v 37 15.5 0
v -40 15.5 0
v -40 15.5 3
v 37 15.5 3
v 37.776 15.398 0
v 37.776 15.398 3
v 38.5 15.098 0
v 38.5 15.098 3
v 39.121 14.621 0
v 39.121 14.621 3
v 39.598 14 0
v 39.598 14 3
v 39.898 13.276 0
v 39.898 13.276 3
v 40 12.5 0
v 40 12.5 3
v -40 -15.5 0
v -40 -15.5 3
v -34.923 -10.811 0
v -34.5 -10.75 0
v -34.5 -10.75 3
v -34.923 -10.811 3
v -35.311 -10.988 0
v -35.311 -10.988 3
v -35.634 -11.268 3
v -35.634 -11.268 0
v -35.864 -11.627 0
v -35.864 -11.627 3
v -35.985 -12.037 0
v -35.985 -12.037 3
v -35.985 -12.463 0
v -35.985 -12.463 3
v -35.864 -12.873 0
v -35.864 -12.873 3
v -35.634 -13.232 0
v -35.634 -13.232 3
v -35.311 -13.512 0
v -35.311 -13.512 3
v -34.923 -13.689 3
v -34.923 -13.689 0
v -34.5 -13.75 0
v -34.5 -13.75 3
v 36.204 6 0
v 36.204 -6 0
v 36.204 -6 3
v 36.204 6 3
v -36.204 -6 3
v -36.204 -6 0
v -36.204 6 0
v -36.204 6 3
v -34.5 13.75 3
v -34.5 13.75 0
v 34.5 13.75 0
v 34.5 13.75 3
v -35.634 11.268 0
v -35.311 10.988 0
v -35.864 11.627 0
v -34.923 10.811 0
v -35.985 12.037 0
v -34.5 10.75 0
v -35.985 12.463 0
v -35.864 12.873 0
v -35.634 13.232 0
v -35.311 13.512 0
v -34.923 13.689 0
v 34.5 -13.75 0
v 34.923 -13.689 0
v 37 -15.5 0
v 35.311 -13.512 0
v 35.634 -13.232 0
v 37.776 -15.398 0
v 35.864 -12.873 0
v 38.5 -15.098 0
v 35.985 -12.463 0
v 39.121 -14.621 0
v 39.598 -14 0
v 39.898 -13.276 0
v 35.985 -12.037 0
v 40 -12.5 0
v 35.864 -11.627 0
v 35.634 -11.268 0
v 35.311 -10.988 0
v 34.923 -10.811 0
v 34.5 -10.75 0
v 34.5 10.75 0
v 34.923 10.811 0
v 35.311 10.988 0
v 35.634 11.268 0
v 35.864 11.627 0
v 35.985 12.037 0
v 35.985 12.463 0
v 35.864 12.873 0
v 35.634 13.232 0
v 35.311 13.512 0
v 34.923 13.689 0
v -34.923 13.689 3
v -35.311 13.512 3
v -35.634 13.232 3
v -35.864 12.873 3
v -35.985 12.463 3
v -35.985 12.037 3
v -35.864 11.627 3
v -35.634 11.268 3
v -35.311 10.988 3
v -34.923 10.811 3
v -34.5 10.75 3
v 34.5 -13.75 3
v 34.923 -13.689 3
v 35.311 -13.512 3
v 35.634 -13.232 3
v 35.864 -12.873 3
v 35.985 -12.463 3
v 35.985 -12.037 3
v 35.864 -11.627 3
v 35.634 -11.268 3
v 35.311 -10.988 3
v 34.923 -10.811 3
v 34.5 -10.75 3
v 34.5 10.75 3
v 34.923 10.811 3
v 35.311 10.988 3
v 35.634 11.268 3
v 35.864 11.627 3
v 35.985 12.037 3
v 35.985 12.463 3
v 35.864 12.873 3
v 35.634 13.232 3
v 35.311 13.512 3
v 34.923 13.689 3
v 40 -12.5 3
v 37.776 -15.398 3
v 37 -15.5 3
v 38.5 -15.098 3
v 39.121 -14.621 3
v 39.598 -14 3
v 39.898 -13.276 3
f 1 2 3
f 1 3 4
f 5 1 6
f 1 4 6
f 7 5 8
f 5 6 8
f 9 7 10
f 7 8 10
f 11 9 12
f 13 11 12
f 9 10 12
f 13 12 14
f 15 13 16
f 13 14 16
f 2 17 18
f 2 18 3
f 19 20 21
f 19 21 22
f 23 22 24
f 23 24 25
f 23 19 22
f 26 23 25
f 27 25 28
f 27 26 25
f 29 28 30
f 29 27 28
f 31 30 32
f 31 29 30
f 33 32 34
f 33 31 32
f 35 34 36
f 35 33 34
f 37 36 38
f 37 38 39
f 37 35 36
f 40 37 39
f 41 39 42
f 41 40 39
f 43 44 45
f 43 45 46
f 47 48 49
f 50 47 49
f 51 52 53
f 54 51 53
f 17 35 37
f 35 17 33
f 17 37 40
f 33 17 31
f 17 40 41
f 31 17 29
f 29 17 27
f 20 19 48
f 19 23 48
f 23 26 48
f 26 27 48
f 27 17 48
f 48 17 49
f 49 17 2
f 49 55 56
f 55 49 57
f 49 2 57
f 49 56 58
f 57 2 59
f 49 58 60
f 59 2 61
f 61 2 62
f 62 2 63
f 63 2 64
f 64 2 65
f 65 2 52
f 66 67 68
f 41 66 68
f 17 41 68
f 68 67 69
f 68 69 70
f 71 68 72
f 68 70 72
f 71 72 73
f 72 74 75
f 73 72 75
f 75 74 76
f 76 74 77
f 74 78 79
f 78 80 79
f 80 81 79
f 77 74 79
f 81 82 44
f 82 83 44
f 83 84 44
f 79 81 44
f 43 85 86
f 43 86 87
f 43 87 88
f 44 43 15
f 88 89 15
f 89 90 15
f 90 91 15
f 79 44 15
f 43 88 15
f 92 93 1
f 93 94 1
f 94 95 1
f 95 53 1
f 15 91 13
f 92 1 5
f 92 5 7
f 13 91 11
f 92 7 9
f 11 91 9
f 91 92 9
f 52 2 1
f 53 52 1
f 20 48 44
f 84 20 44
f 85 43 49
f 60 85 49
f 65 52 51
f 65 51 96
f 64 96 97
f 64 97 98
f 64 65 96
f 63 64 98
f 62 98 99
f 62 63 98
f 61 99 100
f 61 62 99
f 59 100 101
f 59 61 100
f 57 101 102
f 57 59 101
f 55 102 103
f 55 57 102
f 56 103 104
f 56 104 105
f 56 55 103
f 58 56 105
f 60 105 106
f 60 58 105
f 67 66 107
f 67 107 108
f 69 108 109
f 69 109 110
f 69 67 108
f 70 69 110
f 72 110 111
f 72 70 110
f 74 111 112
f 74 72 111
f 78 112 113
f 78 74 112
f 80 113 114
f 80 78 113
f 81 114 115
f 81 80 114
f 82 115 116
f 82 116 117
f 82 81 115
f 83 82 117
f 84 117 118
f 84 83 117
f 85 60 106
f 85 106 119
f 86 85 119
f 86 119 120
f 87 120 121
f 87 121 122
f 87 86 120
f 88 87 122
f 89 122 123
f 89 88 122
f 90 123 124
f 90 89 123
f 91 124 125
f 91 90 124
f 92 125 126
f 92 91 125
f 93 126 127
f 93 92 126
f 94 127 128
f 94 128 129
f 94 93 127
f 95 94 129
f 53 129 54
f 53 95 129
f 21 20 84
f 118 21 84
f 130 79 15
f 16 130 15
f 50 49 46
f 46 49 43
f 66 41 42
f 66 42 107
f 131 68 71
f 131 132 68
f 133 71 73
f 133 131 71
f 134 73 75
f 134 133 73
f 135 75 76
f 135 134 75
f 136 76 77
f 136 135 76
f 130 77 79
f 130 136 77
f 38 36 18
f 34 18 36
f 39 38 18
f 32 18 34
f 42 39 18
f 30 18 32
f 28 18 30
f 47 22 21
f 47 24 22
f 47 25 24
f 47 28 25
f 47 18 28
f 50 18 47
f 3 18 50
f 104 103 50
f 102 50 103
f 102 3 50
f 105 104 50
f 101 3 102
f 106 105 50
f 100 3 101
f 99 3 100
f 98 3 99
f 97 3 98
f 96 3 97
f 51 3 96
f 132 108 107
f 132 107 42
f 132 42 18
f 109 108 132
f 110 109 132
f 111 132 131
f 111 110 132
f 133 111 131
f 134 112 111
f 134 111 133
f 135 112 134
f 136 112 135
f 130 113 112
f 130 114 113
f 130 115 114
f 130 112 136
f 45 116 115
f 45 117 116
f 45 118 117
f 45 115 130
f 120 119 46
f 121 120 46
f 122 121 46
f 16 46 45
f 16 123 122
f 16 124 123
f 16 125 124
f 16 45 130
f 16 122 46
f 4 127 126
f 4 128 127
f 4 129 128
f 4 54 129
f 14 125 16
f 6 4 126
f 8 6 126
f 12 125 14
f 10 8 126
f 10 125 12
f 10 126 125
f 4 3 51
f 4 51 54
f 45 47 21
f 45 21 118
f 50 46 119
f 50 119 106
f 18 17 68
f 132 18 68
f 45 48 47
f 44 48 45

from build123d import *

# Parameters (mm, degrees)
SKETCH003_W   = 80
SKETCH003_H   = 31
SKETCH003_W_2 = 72.408426
SKETCH003_H_2 = 12
EXTRUDE_DEPTH = 3
FILLET_R      = 3


with BuildPart() as part:
    # Sketch003 → Extrude (new body)
    with BuildSketch(Plane.XY):
        Rectangle(SKETCH003_W, SKETCH003_H)
        Rectangle(SKETCH003_W_2, SKETCH003_H_2, mode=Mode.SUBTRACT)
        with BuildLine():
            ThreePointArc((-34.5, 13.75), (-36, 12.25), (-34.5, 10.75))
            Line((-34.5, 10.75), (34.5, 10.75))
            ThreePointArc((34.5, 10.75), (36, 12.25), (34.5, 13.75))
            Line((-34.5, 13.75), (34.5, 13.75))
        make_face(mode=Mode.SUBTRACT)
        with BuildLine():
            ThreePointArc((-34.5, -10.75), (-36, -12.25), (-34.5, -13.75))
            Line((-34.5, -13.75), (34.5, -13.75))
            ThreePointArc((34.5, -13.75), (36, -12.25), (34.5, -10.75))
            Line((-34.5, -10.75), (34.5, -10.75))
        make_face(mode=Mode.SUBTRACT)
    extrude(amount=EXTRUDE_DEPTH)

    # Fillet
    fillet_edges = [part.edges().sort_by_distance(p)[0] for p in [
        (40, 15.5, 1.5),
        (40, -15.5, 1.5),
    ]]
    fillet(fillet_edges, radius=FILLET_R)


solid = part.part
